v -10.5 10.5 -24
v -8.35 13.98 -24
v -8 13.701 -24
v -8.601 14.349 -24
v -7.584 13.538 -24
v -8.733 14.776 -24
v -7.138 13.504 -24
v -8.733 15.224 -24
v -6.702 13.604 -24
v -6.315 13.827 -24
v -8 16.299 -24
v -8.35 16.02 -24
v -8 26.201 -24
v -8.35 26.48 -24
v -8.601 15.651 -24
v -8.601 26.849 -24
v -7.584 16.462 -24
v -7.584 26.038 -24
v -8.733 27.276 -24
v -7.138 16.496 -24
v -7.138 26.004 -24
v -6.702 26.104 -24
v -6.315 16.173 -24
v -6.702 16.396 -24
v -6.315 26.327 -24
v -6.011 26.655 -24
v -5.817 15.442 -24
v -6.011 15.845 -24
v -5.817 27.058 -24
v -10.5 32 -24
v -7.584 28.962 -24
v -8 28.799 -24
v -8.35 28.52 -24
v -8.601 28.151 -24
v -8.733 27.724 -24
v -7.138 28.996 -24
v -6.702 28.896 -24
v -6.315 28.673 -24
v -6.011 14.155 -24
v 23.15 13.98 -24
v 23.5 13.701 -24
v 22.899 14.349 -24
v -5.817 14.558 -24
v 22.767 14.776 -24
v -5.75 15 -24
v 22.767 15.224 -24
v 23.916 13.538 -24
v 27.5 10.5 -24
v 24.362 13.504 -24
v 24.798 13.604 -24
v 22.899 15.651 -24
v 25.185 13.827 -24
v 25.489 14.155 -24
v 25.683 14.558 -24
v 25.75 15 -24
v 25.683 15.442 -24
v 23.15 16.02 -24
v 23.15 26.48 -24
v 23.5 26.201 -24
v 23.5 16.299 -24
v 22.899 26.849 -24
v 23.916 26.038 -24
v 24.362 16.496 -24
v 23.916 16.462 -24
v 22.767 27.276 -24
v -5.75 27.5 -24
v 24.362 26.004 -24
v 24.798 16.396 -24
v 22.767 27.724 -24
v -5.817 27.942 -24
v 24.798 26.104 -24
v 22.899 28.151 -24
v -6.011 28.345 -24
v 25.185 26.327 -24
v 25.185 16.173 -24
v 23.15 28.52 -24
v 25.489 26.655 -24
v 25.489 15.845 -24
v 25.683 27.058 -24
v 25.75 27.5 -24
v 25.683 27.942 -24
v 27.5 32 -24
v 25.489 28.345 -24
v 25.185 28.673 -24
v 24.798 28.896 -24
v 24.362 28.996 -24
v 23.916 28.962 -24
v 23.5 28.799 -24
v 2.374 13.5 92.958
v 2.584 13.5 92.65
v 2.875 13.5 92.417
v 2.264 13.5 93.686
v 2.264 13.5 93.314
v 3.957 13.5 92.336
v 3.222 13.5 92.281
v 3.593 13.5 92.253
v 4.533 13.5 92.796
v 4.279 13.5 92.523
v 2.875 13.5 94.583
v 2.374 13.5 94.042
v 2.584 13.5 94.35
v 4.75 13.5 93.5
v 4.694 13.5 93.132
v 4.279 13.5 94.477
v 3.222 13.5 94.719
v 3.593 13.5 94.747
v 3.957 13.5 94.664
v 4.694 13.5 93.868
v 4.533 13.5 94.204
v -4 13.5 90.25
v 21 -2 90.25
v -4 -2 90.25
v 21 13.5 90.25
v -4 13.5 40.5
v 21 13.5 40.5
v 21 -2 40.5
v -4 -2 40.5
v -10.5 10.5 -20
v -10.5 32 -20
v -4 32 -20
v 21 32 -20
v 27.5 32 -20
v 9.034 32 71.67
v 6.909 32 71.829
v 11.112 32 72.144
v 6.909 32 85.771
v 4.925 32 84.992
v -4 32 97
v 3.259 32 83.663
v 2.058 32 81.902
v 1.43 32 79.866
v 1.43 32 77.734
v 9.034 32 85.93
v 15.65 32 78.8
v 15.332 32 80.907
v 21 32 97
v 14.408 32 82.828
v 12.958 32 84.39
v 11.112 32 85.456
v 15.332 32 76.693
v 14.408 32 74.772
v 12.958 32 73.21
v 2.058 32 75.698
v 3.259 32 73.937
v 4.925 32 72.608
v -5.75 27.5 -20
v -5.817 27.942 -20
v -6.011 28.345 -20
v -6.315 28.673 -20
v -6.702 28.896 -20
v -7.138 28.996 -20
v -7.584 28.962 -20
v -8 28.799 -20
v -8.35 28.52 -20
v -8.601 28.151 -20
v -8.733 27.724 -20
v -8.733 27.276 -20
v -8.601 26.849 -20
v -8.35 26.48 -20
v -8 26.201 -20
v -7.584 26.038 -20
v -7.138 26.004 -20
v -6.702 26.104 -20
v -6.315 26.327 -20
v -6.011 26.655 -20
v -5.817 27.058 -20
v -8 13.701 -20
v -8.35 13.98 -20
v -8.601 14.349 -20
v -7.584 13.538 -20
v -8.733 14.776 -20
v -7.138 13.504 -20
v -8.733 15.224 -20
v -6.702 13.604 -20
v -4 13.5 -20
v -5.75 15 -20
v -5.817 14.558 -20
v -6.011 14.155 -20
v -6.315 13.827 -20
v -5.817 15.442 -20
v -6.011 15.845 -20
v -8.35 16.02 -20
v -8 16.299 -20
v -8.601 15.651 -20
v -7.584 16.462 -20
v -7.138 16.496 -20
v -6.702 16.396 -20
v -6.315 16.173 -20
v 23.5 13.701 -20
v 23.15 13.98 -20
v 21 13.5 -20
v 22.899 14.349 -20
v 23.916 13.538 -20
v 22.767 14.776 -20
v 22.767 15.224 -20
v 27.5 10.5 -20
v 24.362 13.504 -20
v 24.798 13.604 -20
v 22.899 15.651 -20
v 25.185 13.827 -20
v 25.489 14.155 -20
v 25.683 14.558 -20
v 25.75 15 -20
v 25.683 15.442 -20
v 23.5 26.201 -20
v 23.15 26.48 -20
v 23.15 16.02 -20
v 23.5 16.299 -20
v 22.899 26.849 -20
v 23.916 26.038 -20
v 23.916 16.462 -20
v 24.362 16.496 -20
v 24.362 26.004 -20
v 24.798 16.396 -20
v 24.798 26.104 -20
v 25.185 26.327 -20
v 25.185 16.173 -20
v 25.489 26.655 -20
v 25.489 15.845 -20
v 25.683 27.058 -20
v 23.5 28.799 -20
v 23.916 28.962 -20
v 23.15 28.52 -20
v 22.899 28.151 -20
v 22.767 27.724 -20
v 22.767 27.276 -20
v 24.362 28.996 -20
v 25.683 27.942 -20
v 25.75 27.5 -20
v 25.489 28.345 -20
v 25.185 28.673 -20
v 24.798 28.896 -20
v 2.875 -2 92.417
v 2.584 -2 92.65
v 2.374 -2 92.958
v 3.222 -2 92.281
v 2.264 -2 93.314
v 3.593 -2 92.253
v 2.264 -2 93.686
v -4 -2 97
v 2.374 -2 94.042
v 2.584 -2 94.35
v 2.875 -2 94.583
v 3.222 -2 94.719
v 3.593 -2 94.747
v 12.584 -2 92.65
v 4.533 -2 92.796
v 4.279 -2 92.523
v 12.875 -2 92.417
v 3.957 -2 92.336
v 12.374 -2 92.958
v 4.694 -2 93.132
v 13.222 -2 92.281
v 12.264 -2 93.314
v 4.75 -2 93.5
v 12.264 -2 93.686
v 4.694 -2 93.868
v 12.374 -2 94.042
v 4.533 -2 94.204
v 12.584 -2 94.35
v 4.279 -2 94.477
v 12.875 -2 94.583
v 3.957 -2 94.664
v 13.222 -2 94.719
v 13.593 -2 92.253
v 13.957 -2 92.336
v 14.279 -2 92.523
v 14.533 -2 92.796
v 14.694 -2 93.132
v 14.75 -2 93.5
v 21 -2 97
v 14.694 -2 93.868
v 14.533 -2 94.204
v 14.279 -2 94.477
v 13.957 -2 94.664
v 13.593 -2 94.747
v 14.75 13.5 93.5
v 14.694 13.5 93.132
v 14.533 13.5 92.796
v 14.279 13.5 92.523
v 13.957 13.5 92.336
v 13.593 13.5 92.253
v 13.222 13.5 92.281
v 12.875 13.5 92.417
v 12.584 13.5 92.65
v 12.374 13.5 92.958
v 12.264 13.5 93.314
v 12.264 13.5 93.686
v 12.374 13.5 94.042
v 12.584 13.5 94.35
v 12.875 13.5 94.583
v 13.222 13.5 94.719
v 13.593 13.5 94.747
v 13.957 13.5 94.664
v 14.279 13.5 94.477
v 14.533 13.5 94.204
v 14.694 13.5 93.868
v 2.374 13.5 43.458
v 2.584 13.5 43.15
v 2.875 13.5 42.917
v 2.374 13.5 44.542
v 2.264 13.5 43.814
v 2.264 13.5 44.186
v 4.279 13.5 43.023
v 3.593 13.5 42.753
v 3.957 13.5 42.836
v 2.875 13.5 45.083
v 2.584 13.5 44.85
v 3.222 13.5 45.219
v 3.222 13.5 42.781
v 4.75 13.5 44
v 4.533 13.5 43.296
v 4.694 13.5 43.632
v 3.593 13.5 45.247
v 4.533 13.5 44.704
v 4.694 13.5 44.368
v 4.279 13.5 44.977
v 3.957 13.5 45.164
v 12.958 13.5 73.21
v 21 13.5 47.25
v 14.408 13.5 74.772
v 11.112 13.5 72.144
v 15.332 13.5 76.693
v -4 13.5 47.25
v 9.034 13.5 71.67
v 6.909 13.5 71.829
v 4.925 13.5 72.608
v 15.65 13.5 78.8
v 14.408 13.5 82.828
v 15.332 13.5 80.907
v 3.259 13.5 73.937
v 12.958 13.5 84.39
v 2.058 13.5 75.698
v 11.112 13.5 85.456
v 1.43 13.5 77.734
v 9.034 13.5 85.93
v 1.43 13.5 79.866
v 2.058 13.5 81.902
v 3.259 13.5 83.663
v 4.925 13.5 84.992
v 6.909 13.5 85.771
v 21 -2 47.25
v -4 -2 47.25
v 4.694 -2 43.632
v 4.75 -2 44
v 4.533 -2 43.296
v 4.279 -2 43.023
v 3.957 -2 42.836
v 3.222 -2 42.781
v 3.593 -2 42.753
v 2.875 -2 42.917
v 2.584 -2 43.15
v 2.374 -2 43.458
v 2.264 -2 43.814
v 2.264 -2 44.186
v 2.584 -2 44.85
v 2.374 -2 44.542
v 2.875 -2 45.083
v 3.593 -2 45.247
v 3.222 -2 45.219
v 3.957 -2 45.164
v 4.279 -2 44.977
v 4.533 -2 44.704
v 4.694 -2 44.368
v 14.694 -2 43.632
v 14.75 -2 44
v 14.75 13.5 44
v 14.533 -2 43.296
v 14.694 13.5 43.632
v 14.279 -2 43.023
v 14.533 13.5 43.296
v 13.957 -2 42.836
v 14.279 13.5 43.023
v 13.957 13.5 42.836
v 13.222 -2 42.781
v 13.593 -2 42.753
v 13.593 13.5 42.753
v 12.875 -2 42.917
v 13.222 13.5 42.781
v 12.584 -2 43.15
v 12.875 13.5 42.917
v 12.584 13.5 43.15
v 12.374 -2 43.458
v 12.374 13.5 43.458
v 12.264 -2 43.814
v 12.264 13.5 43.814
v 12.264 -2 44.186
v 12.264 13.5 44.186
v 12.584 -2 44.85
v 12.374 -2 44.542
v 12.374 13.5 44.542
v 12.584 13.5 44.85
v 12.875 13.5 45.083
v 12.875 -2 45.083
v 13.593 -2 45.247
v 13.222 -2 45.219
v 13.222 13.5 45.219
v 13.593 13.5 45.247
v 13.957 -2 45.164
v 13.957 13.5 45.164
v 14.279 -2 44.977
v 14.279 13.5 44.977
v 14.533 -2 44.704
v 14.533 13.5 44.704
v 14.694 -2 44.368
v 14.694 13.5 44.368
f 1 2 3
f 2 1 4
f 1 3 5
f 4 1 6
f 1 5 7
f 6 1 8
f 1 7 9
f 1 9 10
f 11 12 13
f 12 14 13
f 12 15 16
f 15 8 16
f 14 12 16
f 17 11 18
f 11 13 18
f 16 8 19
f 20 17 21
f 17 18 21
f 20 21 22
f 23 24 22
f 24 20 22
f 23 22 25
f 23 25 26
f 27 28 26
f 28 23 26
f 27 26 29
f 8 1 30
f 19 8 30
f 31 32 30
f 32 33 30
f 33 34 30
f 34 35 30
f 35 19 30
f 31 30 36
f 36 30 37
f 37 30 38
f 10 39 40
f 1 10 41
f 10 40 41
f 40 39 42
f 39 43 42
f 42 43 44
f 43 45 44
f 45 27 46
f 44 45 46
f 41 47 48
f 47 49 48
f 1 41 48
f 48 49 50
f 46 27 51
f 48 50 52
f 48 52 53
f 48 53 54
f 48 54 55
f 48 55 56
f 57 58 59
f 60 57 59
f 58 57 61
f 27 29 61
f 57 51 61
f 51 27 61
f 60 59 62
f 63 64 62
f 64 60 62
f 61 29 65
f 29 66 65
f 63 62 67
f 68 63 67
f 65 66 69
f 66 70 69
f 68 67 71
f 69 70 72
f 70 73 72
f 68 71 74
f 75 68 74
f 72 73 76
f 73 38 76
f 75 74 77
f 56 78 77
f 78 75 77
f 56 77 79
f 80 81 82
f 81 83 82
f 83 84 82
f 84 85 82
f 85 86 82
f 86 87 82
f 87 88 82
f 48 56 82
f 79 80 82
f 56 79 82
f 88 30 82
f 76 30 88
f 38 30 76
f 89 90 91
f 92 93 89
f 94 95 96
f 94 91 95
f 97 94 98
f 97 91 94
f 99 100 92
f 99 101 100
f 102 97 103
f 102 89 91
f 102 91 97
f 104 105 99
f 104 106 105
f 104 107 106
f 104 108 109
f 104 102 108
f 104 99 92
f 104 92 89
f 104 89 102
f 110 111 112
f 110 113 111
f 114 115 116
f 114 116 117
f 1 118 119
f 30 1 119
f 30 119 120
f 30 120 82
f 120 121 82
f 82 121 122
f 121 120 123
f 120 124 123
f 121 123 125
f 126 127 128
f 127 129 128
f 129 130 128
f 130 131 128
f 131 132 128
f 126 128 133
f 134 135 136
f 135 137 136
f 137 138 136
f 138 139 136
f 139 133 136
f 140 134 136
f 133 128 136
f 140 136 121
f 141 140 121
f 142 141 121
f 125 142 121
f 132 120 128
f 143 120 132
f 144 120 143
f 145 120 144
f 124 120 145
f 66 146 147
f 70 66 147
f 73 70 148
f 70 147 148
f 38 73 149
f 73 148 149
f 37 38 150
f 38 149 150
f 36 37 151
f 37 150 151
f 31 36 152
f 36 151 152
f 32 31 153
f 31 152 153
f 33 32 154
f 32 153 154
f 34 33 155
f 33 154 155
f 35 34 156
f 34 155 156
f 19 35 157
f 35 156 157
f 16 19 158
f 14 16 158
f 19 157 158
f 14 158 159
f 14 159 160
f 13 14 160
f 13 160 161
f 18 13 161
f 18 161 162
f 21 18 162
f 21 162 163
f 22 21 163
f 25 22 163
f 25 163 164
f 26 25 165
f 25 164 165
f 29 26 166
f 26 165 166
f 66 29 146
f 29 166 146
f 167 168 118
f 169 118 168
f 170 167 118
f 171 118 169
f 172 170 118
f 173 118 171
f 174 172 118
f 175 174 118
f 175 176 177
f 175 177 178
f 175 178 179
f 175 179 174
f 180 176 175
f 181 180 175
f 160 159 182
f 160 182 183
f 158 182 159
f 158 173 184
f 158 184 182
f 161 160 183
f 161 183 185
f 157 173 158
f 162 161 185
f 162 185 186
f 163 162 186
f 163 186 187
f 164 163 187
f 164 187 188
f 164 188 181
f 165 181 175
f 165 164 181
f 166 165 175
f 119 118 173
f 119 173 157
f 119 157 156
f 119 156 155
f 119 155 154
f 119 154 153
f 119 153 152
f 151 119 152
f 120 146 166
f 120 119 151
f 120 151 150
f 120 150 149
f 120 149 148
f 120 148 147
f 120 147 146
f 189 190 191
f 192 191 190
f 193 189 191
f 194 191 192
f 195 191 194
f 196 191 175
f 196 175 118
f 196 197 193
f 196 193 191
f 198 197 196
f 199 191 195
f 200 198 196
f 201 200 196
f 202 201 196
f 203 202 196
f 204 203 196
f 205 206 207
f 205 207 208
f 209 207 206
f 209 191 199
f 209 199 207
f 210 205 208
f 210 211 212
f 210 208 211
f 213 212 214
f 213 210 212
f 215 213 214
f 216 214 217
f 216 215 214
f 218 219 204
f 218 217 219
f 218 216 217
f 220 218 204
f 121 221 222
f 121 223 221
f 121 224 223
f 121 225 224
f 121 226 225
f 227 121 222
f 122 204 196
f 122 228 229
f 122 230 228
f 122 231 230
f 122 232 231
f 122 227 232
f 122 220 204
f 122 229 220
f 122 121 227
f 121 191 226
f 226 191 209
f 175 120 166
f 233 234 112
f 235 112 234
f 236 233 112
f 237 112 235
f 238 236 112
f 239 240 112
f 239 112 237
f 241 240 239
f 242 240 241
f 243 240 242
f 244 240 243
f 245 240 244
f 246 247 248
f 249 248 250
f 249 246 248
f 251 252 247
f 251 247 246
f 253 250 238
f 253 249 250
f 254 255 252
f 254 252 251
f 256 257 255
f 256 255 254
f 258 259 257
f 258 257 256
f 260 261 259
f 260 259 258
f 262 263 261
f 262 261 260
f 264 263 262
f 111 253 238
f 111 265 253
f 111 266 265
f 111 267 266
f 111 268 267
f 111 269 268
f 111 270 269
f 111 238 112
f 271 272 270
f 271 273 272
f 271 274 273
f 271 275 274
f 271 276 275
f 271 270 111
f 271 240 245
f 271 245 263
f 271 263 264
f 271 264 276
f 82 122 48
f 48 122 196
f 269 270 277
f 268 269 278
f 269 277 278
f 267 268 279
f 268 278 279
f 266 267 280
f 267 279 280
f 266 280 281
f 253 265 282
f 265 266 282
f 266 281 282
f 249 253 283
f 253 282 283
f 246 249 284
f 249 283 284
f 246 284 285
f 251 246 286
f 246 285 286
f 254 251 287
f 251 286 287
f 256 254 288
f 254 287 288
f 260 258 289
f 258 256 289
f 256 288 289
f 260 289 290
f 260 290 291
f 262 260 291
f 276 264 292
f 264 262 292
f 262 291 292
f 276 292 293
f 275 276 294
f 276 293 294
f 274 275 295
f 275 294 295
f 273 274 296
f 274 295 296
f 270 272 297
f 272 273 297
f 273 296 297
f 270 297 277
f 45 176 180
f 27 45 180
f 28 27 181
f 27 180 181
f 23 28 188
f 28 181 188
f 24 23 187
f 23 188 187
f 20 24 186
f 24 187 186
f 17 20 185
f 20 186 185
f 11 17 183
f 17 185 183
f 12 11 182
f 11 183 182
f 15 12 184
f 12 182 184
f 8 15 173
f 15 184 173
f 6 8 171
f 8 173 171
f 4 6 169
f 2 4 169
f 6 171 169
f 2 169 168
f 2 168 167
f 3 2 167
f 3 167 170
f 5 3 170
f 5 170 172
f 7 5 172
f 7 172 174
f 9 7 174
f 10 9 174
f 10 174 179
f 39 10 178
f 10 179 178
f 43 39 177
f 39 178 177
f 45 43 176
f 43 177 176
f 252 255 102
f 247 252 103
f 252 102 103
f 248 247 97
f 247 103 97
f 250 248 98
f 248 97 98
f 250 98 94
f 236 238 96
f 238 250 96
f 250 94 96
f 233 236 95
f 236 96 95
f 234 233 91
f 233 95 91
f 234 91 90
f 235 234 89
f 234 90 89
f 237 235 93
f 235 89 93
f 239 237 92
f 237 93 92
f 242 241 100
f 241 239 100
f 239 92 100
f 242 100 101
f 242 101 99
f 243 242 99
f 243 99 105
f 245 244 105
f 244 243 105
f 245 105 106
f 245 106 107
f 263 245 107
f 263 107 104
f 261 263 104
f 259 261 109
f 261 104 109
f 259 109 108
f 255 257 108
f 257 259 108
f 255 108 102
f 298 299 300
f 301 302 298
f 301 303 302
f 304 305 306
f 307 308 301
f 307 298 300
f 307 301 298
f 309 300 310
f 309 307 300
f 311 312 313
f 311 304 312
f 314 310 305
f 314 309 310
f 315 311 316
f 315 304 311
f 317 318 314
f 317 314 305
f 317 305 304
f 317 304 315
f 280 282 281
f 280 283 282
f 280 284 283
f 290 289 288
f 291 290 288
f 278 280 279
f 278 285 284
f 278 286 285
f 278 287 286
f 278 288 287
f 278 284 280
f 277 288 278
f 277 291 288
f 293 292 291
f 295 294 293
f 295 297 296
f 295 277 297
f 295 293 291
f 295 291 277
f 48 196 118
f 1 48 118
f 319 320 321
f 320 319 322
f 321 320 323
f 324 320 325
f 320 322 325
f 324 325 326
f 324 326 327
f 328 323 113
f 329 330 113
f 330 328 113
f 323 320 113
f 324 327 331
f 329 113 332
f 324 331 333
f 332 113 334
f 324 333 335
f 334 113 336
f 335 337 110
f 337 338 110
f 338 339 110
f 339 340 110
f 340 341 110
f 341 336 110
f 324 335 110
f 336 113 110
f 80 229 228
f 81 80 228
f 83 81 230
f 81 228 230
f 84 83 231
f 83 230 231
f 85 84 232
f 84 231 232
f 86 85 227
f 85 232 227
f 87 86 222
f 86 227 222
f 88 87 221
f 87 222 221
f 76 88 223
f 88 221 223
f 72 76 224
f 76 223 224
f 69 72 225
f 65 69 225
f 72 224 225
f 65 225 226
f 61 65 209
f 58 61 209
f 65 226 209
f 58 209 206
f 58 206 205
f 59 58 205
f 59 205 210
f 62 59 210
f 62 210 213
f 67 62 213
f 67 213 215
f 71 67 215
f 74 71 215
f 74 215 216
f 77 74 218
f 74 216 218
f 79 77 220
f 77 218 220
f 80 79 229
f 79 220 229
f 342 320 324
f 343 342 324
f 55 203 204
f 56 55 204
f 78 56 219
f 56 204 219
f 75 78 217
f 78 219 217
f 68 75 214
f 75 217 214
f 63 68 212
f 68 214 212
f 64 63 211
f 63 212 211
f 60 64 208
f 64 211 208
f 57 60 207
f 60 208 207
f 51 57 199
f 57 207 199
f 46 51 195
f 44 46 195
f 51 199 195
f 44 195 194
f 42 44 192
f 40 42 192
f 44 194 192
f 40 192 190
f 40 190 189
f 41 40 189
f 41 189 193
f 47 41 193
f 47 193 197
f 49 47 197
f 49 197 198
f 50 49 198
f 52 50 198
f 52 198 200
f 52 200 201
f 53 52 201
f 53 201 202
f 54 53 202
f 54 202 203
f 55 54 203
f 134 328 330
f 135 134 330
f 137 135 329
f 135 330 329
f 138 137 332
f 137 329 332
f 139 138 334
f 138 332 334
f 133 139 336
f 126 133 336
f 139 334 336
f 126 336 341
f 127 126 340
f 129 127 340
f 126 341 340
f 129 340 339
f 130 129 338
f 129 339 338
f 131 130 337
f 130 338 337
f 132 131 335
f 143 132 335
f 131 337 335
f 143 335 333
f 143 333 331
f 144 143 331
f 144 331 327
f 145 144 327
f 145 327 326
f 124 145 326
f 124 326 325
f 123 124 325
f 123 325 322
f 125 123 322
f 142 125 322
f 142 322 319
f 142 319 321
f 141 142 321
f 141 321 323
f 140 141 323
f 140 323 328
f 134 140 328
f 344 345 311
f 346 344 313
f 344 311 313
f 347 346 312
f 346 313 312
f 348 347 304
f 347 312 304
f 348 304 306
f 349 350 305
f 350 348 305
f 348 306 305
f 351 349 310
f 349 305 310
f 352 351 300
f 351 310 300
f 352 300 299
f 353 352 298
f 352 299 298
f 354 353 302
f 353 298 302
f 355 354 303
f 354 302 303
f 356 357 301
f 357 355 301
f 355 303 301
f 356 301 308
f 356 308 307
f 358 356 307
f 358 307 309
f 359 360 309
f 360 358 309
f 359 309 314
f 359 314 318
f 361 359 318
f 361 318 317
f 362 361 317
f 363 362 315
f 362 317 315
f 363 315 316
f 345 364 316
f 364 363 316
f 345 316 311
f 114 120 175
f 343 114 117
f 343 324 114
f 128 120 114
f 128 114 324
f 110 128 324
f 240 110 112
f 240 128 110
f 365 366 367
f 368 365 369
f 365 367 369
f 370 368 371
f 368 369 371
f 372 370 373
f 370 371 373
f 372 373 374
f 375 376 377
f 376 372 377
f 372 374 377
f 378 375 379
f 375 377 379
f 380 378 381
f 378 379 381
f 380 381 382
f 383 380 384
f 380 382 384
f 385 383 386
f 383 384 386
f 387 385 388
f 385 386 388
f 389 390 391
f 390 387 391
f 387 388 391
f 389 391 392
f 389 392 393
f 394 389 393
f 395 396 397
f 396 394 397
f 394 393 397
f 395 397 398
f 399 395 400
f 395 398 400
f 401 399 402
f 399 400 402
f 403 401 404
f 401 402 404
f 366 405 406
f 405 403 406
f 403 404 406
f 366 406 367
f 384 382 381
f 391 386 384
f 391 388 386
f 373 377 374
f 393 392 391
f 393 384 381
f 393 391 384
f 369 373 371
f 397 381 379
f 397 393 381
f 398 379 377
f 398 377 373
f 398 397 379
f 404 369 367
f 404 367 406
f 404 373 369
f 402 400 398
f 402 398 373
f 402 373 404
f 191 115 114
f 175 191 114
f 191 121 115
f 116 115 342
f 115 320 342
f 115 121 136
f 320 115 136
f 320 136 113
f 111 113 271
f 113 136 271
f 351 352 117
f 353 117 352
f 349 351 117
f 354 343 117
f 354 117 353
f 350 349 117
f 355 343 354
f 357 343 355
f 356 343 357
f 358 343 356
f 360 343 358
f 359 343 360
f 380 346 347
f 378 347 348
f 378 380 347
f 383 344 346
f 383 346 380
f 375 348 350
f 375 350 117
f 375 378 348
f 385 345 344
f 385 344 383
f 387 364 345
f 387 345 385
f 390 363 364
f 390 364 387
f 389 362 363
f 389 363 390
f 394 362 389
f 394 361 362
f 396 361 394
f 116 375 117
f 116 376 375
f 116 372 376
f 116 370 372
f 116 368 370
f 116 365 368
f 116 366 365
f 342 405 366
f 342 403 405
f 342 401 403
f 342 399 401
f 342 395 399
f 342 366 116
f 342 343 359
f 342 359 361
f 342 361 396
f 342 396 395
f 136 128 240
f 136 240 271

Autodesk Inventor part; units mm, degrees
ref_plane "YZ Plane" through (0, 0, 0) normal (1, 0, 0) x (0, 1, 0)
ref_plane "XZ Plane" through (0, 0, 0) normal (0, 1, 0) x (-1, 0, 0)
ref_plane "XY Plane" through (0, 0, 0) normal (0, 0, 1) x (1, 0, 0)
sketch "Sketch14" plane through (0, 0, 0) normal (0, 0, 1) x (1, 0, 0)
  line L0 (0, 0) -> (17, 0)
  line L1 (17, 0) -> (17, 30)
  line L2 (17, 30) -> (0, 30)
  line L3 (0, 30) -> (0, 0)
  line L4 (-6, 36) -> (23, 36)
  line L5 (23, 36) -> (23, -6)
  line L6 (23, -6) -> (-6, -6)
  line L7 (-6, -6) -> (-6, 36)
  dimension "d55" = 17
  dimension "d56" = 30
  dimension "d57" = 6
extrude "Extrusion12" add sketch "Sketch14" against normal blind 3 contours L3 L2 L1 L0 | L4 L5 L6 L7
extrude "Extrusion13" add sketch "Sketch14" along normal blind 90 contours L3 L2 L1 L0
sketch "Sketch15" plane through (0, 0, 0) normal (0, -1, 0) x (1, 0, 0)
  line L0 (0, 0) -> (0, 90) projected
  line L1 (0, 90) -> (17.1111, 90)
  line L2 (0, 90) -> (17, 90)
  line L3 (17, 90) -> (17, 97)
  line L4 (17, 97) -> (0, 97)
  line L5 (0, 97) -> (0, 90)
  line L6 (17, 90) -> (0, 90) projected
  circle A0 centre (3.5, 93.5) radius 1.25
  circle A1 centre (13.5, 93.5) radius 1.25
  line L7 (8.5, 113.1) -> (8.5, 78.8)
  circle A2 centre (8.5, 78.8) radius 7.15
  circle A3 centre (3.5, 44) radius 1.25
  circle A4 centre (13.5, 44) radius 1.25
  line L8 (17, 0) -> (17, 90) projected
  line L9 (0, 97) -> (17, 97)
  line L10 (17, 97) -> (17, 42)
  line L11 (17, 42) -> (0, 42)
  line L12 (0, 42) -> (0, 97)
  line L13 (8.5, 113.1) -> (8.5, 98.4)
  line L14 (3.5, 44) -> (13.5, 44)
  dimension "d67" = 7
  dimension "d70" = 2.5
  dimension "d71" = 2.5
  dimension "d72" = 34.3
  dimension "d73" = 14.3
  dimension "d79" = 55
  dimension "d95" = 14.7
extrude "Extrusion14" cut sketch "Sketch15" against normal blind 169.375 contours A2
extrude "Extrusion15" cut sketch "Sketch15" against normal blind 15.5 contours L0 L1 L8 L11
extrude "Extrusion16" cut sketch "Sketch15" against normal blind 20 contours A3 | A4
extrude "Extrusion17" add sketch "Sketch15" against normal blind 30 contours L5 L4 L7 L1 | L7 L4 L3 L1
sketch "Sketch16" plane through (0, 0, 0) normal (0, -1, 0) x (1, 0, 0)
  line L0 (0, 0) -> (0, 97) projected
  line L1 (17, 0) -> (17, 97) projected
  line L2 (0, 97) -> (17, 97)
  line L3 (17, 97) -> (17, 90)
  line L4 (17, 90) -> (0, 90)
  line L5 (0, 90) -> (0, 97)
  dimension "d86" = 7
extrude "Extrusion18" cut sketch "Sketch15" against normal blind 15.5 contours L5 L4 L7 L1 | L7 L4 L3 L1
sketch "Sketch17" plane through (0, 15.5, 0) normal (0, -1, 0) x (1, 0, 0)
  line L0 (0, 97) -> (17, 97) projected
  line L1 (17, 0) -> (17, 97) projected
  line L2 (0, 97) -> (17, 97)
  line L3 (17, 97) -> (17, 91)
  line L4 (17, 91) -> (0, 91)
  line L5 (0, 91) -> (0, 97)
  line L6 (17, 42) -> (0, 42) projected
  line L7 (0, 42) -> (17, 42)
  line L8 (17, 42) -> (17, 47)
  line L9 (17, 47) -> (0, 47)
  line L10 (0, 47) -> (0, 42)
  circle A0 centre (3.5, 44) radius 1.25 projected
  circle A1 centre (3.5, 44) radius 1.25
  circle A2 centre (13.5, 44) radius 1.25 projected
  circle A3 centre (13.5, 44) radius 1.25
  circle A4 centre (3.5, 93.5) radius 1.25 projected
  circle A5 centre (3.5, 93.5) radius 1.25
  circle A6 centre (13.5, 93.5) radius 1.25 projected
  circle A7 centre (13.5, 93.5) radius 1.25
  point P0 (0, 0)
  dimension "d89" = 6
  dimension "d90" = 5
  dimension "d91" = 2.5
  dimension "d92" = 2.5
extrude "Extrusion19" add sketch "Sketch17" along normal blind 15.5
sketch "Sketch19" plane through (0, 0, 0) normal (0, -1, 0) x (1, 0, 0)
  line L0 (0, 0) -> (0, 47) projected
  line L1 (17, 0) -> (17, 47) projected
  line L2 (0, 0) -> (17, 0)
  line L3 (17, 0) -> (17, 40)
  line L4 (17, 40) -> (0, 40)
  line L5 (0, 40) -> (0, 0)
  dimension "d96" = 40
extrude "Extrusion20" cut sketch "Sketch19" against normal blind 15.5
sketch "Sketch23" plane through (0, 0, 0) normal (0, 0, 1) x (1, 0, 0)
  line L0 (0, 15.5) -> (17, 15.5) projected
  line L1 (0, 15.5) -> (0, 9.5)
  line L2 (0, 15.5) -> (0, 0) projected
  line L3 (0, 9.5) -> (-6, 9.5)
  line L4 (-6, -6) -> (-6, 36) projected
  line L5 (23, 36) -> (23, -6) projected
  line L6 (23, 9.5) -> (0, 9.5)
  line L7 (-6, 9.5) -> (23, 9.5)
  line L8 (23, 9.5) -> (23, 36)
  line L9 (23, 36) -> (-6, 36)
  line L10 (-6, 36) -> (-6, 9.5)
  line L11 (23, -6) -> (-6, -6) projected
  line L12 (-6, -6) -> (23, -6)
  line L13 (23, -6) -> (23, 9.5)
  line L14 (23, 9.5) -> (-6, 9.5)
  line L15 (-6, 9.5) -> (-6, -6)
  dimension "d99" = 6
extrude "Extrusion21" cut sketch "Sketch23" against normal blind 15.5 contours L6 L5 L11 L4 L3
sketch "Sketch24" plane through (0, 30, 97) normal (0, 0, 1) x (1, 0, 0)
  line L0 (17, 0) -> (17, -14.5) projected
  line L1 (17, 0) -> (19, 0)
  line L2 (19, 0) -> (19, 2)
  line L3 (0, -14.5) -> (0, -30) projected
  line L4 (0, -14.5) -> (-2, -14.5)
  line L5 (-2, -14.5) -> (-2, -16.5)
  line L6 (-2, -16.5) -> (19, -16.5)
  line L7 (19, -16.5) -> (19, 2)
  line L8 (19, 2) -> (-2, 2)
  line L9 (-2, 2) -> (-2, -16.5)
  dimension "d111" = 2
  dimension "d112" = 2
  dimension "d113" = 2
  dimension "d114" = 2
extrude "Extrusion22" add sketch "Sketch24" against normal blind 97
extrude "Extrusion23" cut sketch "Sketch15" against normal blind 169.375 contours A2
sketch "Sketch26" plane through (-2, 13.5, 0) normal (0, -1, 0) x (1, 0, 0)
  line L0 (0, 97) -> (2, 97) projected
  line L1 (2, 97) -> (2, 91) projected
  line L2 (0, 97) -> (2, 97)
  line L3 (2, 97) -> (2, 91)
  line L4 (2, 91) -> (0, 91)
  line L5 (0, 91) -> (0, 97)
  line L6 (2, 91) -> (19, 91) projected
  line L7 (19, 97) -> (21, 97) projected
  line L8 (19, 91) -> (21, 91)
  line L9 (21, 91) -> (21, 97)
  line L10 (21, 97) -> (19, 97)
  line L11 (19, 97) -> (19, 91)
  line L12 (2, 40) -> (19, 40) projected
  line L13 (0, 97) -> (0, 0) projected
  line L14 (2, 40) -> (0, 40)
  line L15 (0, 40) -> (0, 47)
  line L16 (0, 47) -> (2, 47)
  line L17 (2, 47) -> (2, 40)
  line L18 (19, 40) -> (19, 47) projected
  line L19 (21, 97) -> (21, 0) projected
  line L20 (19, 40) -> (21, 40)
  line L21 (21, 40) -> (21, 47)
  line L22 (21, 47) -> (19, 47)
  line L23 (19, 47) -> (19, 40)
  point P0 (2, 0)
  point P1 (0, 40)
  dimension "d119" = 7
extrude "Extrusion24" add sketch "Sketch26" along normal blind 13.5 contours L0 L1 L4 L5 | L16 L17 L14 L13 | L11 L7 L9 L8 | L19 L20 L18 L22
sketch "Sketch27" plane through (0, 0, 0) normal (0, 0, 1) x (1, 0, 0)
  point P0 (0, 0)
sketch "Sketch28" plane through (0, 0, 0) normal (0, 0, 1) x (1, 0, 0)
  line L0 (-6, 9.5) -> (-6, 36) projected
  line L1 (-6, 36) -> (23, 36) projected
  line L2 (-6, 31.9237) -> (23, 31.9237)
  line L3 (23, 31.9237) -> (23, 36)
  line L4 (23, 36) -> (-6, 36)
  line L5 (-6, 36) -> (-6, 31.9237)
  point P0 (0, 0)
extrude "Extrusion25" cut sketch "Sketch28" against normal blind 13.5
sketch "Sketch29" plane through (0, 0, 0) normal (0, -1, 0) x (1, 0, 0)
  point P0 (0, 0)
sketch "Sketch30" plane through (0, 0, 0) normal (0, -1, 0) x (1, 0, 0)
  line L0 (19, 97) -> (-2, 97) projected
  line L1 (-2, 91) -> (19, 91) projected
  line L2 (-2, 97) -> (19, 97)
  line L3 (19, 97) -> (19, 91)
  line L4 (19, 91) -> (-2, 91)
  line L5 (-2, 91) -> (-2, 97)
  line L6 (-2, 47) -> (-2, 40) projected
  line L7 (-2, 40) -> (19, 40) projected
  line L8 (-2, 47) -> (19, 47)
  line L9 (19, 47) -> (19, 40)
  line L10 (19, 40) -> (-2, 40)
  line L11 (-2, 40) -> (-2, 47)
  circle A0 centre (3.5, 93.5) radius 1.25 projected
  circle A1 centre (3.5, 93.5) radius 1.25
  circle A2 centre (13.5, 93.5) radius 1.25 projected
  circle A3 centre (13.5, 93.5) radius 1.25
  circle A4 centre (3.5, 44) radius 1.25 projected
  circle A5 centre (3.5, 44) radius 1.25
  circle A6 centre (13.5, 44) radius 1.25 projected
  circle A7 centre (13.5, 44) radius 1.25
  point P0 (0, 0)
extrude "Extrusion26" add sketch "Sketch30" along normal blind 2
sketch "Sketch31" plane through (0, 0, -3) normal (0, 0, -1) x (-1, 0, 0)
  point P0 (0, 0)
  point P1 (6, 9.5)
  point P2 (-23, 31.9237)
sketch "Sketch32" plane through (-2, 13.5, 47) normal (0, -1, 0) x (1, 0, 0)
  point P0 (2, -47)
sketch "Sketch33" plane through (-2, 32, 97) normal (0, 0, 1) x (1, 0, 0)
  line L0 (21, -34) -> (21, 0) projected
  line L1 (-4, -22.5) -> (25, -22.5) projected
  line L2 (21, 0) -> (23, 0)
  line L3 (23, 0) -> (23, -22.5)
  line L4 (23, -22.5) -> (21, -22.5)
  line L5 (21, -22.5) -> (21, 0)
  line L6 (0, -18.5) -> (0, -34) projected
  line L7 (-4, -0.0763) -> (25, -0.0763) projected
  line L8 (0, -22.5) -> (-2, -22.5)
  line L9 (-2, -22.5) -> (-2, -0.0763)
  line L10 (-2, -0.0763) -> (0, -0.0763)
  line L11 (0, -0.0763) -> (0, -22.5)
  line L12 (0, -18.5) -> (-2, -18.5)
  line L13 (21, -18.5) -> (21, -34) projected
  line L14 (21, -18.5) -> (23, -18.5)
  point P0 (2, -32)
  point P1 (0, -0.0763)
  point P2 (23, -0.0763)
  point P3 (21, -0.0763)
  dimension "d126" = 2
  dimension "d127" = 2
extrude "Extrusion27" add sketch "Sketch33" against normal blind 100 contours L0 L7 L3 L14 | L12 L9 L7 L11
sketch "Sketch34" plane through (0, -2, 0) normal (0, -1, 0) x (1, 0, 0)
  line L0 (-2, 47) -> (19, 47) projected
  line L1 (-2, 47) -> (-2, 40) projected
  line L2 (19, 47) -> (-2, 47)
  line L3 (-2, 47) -> (-2, 41)
  line L4 (-2, 41) -> (19, 41)
  line L5 (19, 41) -> (19, 47)
  line L6 (-2, 40) -> (19, 40) projected
  line L7 (19, 41) -> (-2, 41)
  line L8 (-2, 41) -> (-2, 40)
  line L9 (-2, 40) -> (19, 40)
  line L10 (19, 40) -> (19, 41)
  point P0 (0, 0)
  dimension "d130" = 6
sketch "Sketch35" plane through (0, -2, 0) normal (0, -1, 0) x (1, 0, 0)
  line L0 (-2, 47) -> (19, 47) projected
  line L1 (-2, 47) -> (-2, 91) projected
  line L2 (19, 47) -> (-2, 47)
  line L3 (-2, 47) -> (-2, 46.5)
  line L4 (-2, 46.5) -> (19, 46.5)
  line L5 (19, 46.5) -> (19, 47)
  line L6 (-2, 40) -> (19, 40) projected
  line L7 (-2, 47) -> (-2, 40) projected
  line L8 (19, 40) -> (-2, 40)
  line L9 (-2, 40) -> (-2, 40.5)
  line L10 (-2, 40.5) -> (19, 40.5)
  line L11 (19, 40.5) -> (19, 40)
  point P0 (0, 0)
  point P1 (-2, 41)
  dimension "d133" = 0.5
  dimension "d136" = 0.5
extrude "Extrusion29" cut sketch "Sketch35" against normal blind 15.5 contours L0 L5 L4 L3
extrude "Extrusion30" cut sketch "Sketch35" against normal blind 15.5 contours L10 L11 L6 L7
sketch "Sketch36" plane through (-2, 13.5, 91) normal (0, -1, 0) x (1, 0, 0)
  line L0 (-2, 6) -> (0, 6) projected
  line L1 (21, 0) -> (0, 0) projected
  line L2 (-2, 6) -> (0, 6)
  line L3 (0, 6) -> (0, 0)
  line L4 (0, 0) -> (-2, 0)
  line L5 (-2, 0) -> (-2, 6)
  line L6 (21, 0) -> (21, 6) projected
  line L7 (23, 6) -> (23, -91) projected
  line L8 (21, 6) -> (23, 6)
  line L9 (23, 6) -> (23, 0)
  line L10 (23, 0) -> (21, 0)
  line L11 (21, 0) -> (21, 6)
  line L12 (21, -44.5) -> (0, -44.5) projected
  line L13 (-2, 6) -> (-2, -91) projected
  line L14 (0, -44.5) -> (-2, -44.5)
  line L15 (-2, -44.5) -> (-2, -50.5)
  line L16 (-2, -50.5) -> (0, -50.5)
  line L17 (0, -50.5) -> (0, -44.5)
  line L18 (21, -44.5) -> (23, -44.5)
  line L19 (23, -44.5) -> (23, -50.5)
  line L20 (23, -50.5) -> (21, -50.5)
  line L21 (21, -50.5) -> (21, -44.5)
  point P0 (2, -91)
  point P1 (23, -44.5)
  dimension "d139" = 6
extrude "Extrusion31" add sketch "Sketch36" along normal blind 15.5 contours L0 L3 L4 L5 | L14 L17 L16 L13 | L6 L8 L7 L10 | L18 L7 L20 L21
sketch "Sketch37" plane through (0, 0, -3) normal (0, 0, -1) x (-1, 0, 0)
  line L0 (-23, 9.5) -> (6, 9.5) projected
  line L1 (-23, 9.5) -> (6, 9.5)
  line L2 (6, 9.5) -> (6, 32)
  line L3 (6, 32) -> (-23, 32)
  line L4 (-23, 32) -> (-23, 9.5)
  point P0 (0, 0)
  point P1 (6, 9.5)
  dimension "d142" = 29
extrude "Extrusion32" add sketch "Sketch37" against normal blind 3
sketch "Sketch38" plane through (0, 0, -3) normal (0, 0, -1) x (-1, 0, 0)
  line L0 (-23, 9.5) -> (6, 9.5) projected
  line L1 (-23, 9.5) -> (-27, 9.5)
  line L2 (-27, 9.5) -> (-27, 32)
  line L3 (6, 32) -> (-23, 32) projected
  line L4 (-27, 32) -> (6, 32)
  line L5 (6, 9.5) -> (10, 9.5)
  line L6 (10, 9.5) -> (10, 32)
  line L7 (10, 32) -> (-27, 32)
  point P0 (0, 0)
  dimension "d145" = 4
  dimension "d146" = 4
extrude "Extrusion33" add sketch "Sketch38" against normal blind 3
sketch "Sketch39" plane through (0, 0, 0) normal (0, 0, 1) x (1, 0, 0)
  line L0 (21, 31.9237) -> (19, 31.9237) projected
  line L1 (19, 32) -> (19, 31.9237) projected
  line L2 (21, 31.9237) -> (19, 31.9237)
  line L3 (19, 31.9237) -> (19, 32)
  line L4 (19, 32) -> (21, 32)
  line L5 (21, 32) -> (21, 31.9237)
  line L6 (-2, 31.9237) -> (-2, 32) projected
  line L7 (-2, 31.9237) -> (-4, 31.9237) projected
  line L8 (-2, 32) -> (-4, 32)
  line L9 (-4, 32) -> (-4, 31.9237)
  line L10 (-4, 31.9237) -> (-2, 31.9237)
  line L11 (-2, 31.9237) -> (-2, 32)
  point P0 (0, 0)
extrude "Extrusion34" add sketch "Sketch39" along normal blind 97
sketch "Sketch40" plane through (0, 0, 0) normal (0, 0, 1) x (1, 0, 0)
  point P0 (0, 0)
sketch "Sketch41" plane through (0, 0, 0) normal (0, 0, 1) x (1, 0, 0)
  line L0 (-10, 32) -> (-10, 27.5)
  line L1 (-10, 32) -> (-10, 9.5) projected
  line L2 (-10, 9.5) -> (27, 9.5) projected
  line L3 (-10, 9.5) -> (-10, 14)
  line L4 (-10, 9.5) -> (-10.5, 9.5)
  line L5 (-10.5, 9.5) -> (-10.5, 32)
  line L6 (-10.5, 32) -> (-10, 32)
  line L7 (-10, 32) -> (-10, 9.5)
  line L8 (-10.5, 14) -> (-7.5, 14)
  line L9 (-10.5, 27.5) -> (-7.5, 27.5)
  circle A0 centre (-7.5, 14) radius 1.5
  circle A1 centre (-7.5, 27.5) radius 1.5
  line L10 (27, 9.5) -> (27, 32) projected
  line L11 (27, 9.5) -> (27.5, 9.5)
  line L12 (27.5, 9.5) -> (27.5, 32)
  line L13 (27.5, 32) -> (27, 32)
  line L14 (27, 32) -> (27, 9.5)
  line L15 (27.5, 9.5) -> (27.5, 14)
  line L16 (27.5, 14) -> (24.5, 14)
  line L17 (27.5, 32) -> (27.5, 27.5)
  line L18 (27.5, 27.5) -> (24.5, 27.5)
  circle A2 centre (24.5, 14) radius 1.5
  circle A3 centre (24.5, 27.5) radius 1.5
  point P0 (0, 0)
  dimension "d151" = 4.5
  dimension "d152" = 4.5
  dimension "d153" = 0.5
  dimension "d154" = 3
  dimension "d155" = 3
  dimension "d156" = 3
  dimension "d157" = 3
  dimension "d158" = 0.5
  dimension "d159" = 4.5
  dimension "d160" = 3
  dimension "d161" = 4.5
  dimension "d162" = 3
  dimension "d163" = 3
  dimension "d164" = 3
sketch "Sketch42" plane through (0, 0, -3) normal (0, 0, -1) x (-1, 0, 0)
  point P0 (0, 0)
sketch "Sketch43" plane through (0, 0, -3) normal (0, 0, -1) x (-1, 0, 0)
  line L0 (-21, -2) -> (-21, 32) projected
  line L1 (4, 13.5) -> (4, -2) projected
  line L2 (-21, 32) -> (4, 32)
  line L3 (4, 32) -> (4, 9.5)
  line L4 (4, 9.5) -> (-21, 9.5)
  line L5 (-21, 9.5) -> (-21, 32)
  point P0 (0, 0)
  dimension "d165" = 22.5
sketch "Sketch44" plane through (0, 0, -3) normal (0, 0, -1) x (-1, 0, 0)
  line L0 (10, 9.5) -> (10, 32) projected
  line L1 (10, 9.5) -> (-28.3786, 9.5)
  line L2 (-28.3786, 9.5) -> (-28.3786, 33.0505)
  line L3 (-28.3786, 33.0505) -> (10, 33.0505)
  line L4 (10, 33.0505) -> (10, 9.5)
  point P0 (0, 0)
extrude "Extrusion35" cut sketch "Sketch44" against normal blind 3
sketch "Sketch45" plane through (0, 0, 0) normal (0, 0, -1) x (-1, 0, 0)
  line L0 (4, 13.5) -> (-21, 13.5) projected
  line L1 (4, 32) -> (4, -2) projected
  line L2 (-21, 13.5) -> (4, 13.5)
  line L3 (4, 13.5) -> (4, 32)
  line L4 (4, 32) -> (-21, 32)
  line L5 (-21, 32) -> (-21, 13.5)
  point P0 (0, 0)
extrude "Extrusion36" add sketch "Sketch45" along normal blind 20
sketch "Sketch46" plane through (0, 0, -20) normal (0, 0, -1) x (-1, 0, 0)
  line L0 (-21, 32) -> (4, 32) projected
  line L1 (-21, 32) -> (-27.5, 32)
  line L2 (-27.5, 32) -> (-27.5, 13.5)
  line L3 (-27.5, 13.5) -> (-21, 13.5)
  line L4 (-21, 13.5) -> (-21, 32)
  line L5 (4, 32) -> (4, -2) projected
  line L6 (4, 32) -> (10.5, 32)
  line L7 (10.5, 32) -> (10.5, 13.5)
  line L8 (10.5, 13.5) -> (4, 13.5)
  line L9 (4, 13.5) -> (4, 32)
  line L10 (10.5, 13.5) -> (-27.5, 13.5)
  point P0 (0, 0)
extrude "Extrusion37" add sketch "Sketch46" along normal blind 4
sketch "Sketch47" plane through (0, 0, -20) normal (0, 0, 1) x (1, 0, 0)
  line L0 (-4, 13.5) -> (-10.5, 13.5) projected
  line L1 (-10.5, 13.5) -> (27.5, 13.5)
  line L2 (27.5, 13.5) -> (27.5, 10.5)
  line L3 (27.5, 10.5) -> (-10.5, 10.5)
  line L4 (-10.5, 10.5) -> (-10.5, 13.5)
  point P0 (0, 0)
  dimension "d175" = 3
extrude "Extrusion38" add sketch "Sketch47" against normal blind 4
sketch "Sketch48" plane through (0, 0, -20) normal (0, 0, 1) x (1, 0, 0)
  line L0 (-10.5, 10.5) -> (27.5, 10.5) projected
  line L1 (-10.5, 10.5) -> (-10.5, 15)
  line L2 (-10.5, 10.5) -> (-10.5, 32) projected
  line L3 (-10.5, 15) -> (-7.25, 15)
  line L4 (-10.5, 32) -> (-10.5, 27.5)
  line L5 (-10.5, 27.5) -> (-7.25, 27.5)
  circle A0 centre (-7.25, 15) radius 1.5
  circle A1 centre (-7.25, 27.5) radius 1.5
  line L6 (27.5, 32) -> (27.5, 10.5) projected
  line L7 (27.5, 10.5) -> (27.5, 15)
  line L8 (27.5, 15) -> (27.5, 18)
  line L9 (27.5, 15) -> (24.25, 15)
  line L10 (-10.5, 32) -> (27.5, 32) projected
  line L11 (27.5, 32) -> (27.5, 27.5)
  line L12 (27.5, 27.5) -> (24.25, 27.5)
  circle A2 centre (24.25, 27.5) radius 1.5
  circle A3 centre (24.25, 15) radius 1.5
  line L13 (-7.5, 15) -> (-7.25, 15)
  line L14 (24.5, 15) -> (24.25, 15)
  point P0 (0, 0)
  dimension "d178" = 4.5
  dimension "d180" = 4.5
  dimension "d184" = 4.5
  dimension "d185" = 3
  dimension "d187" = 4.5
  dimension "d195" = 0.25
extrude "Extrusion39" cut sketch "Sketch48" against normal blind 4 contours A3 | A2 | A1 | A0
sketch "Sketch49" plane through (0, -2, 0) normal (0, -1, 0) x (1, 0, 0)
  point P0 (0, 0)
sketch "Sketch50" plane through (-4, 13.5, 91) normal (0, -1, 0) x (1, 0, 0)
  point P0 (4, -91)
sketch "019855" plane through (-4, 13.5, 91) normal (0, -1, 0) x (1, 0, 0)
  circle A0 centre (12.5, -12.2) radius 7.15 projected
  line L0 (19.65, -10.7) -> (19.65, -13.7)
  line L1 (19.65, -13.7) -> (19.65, -12.2)
  line L2 (5.35, -10.7) -> (5.35, -13.7)
  line L3 (5.5091, -12.2) -> (5.35, -12.2)
  line L4 (19.65, -10.7) -> (19.65, -13.7)
  line L5 (5.35, -13.7) -> (5.35, -10.7)
  point P0 (4, -91)
  point P1 (19.65, -12.2)
thread "Thread5" size "M2.5x0.45" class "6H" standard "ANSI Metric M Profile" full length
thread "Thread6" size "M2.5x0.45" class "6H" standard "ANSI Metric M Profile" full length
thread "Thread7" size "M2.5x0.45" class "6H" standard "ANSI Metric M Profile" full length
thread "Thread8" size "M2.5x0.45" class "6H" standard "ANSI Metric M Profile" full length
sketch "Sketch52" plane through (0, -2, 0) normal (0, -1, 0) x (1, 0, 0)
  point P0 (0, 0)
sketch "Sketch53" plane through (-4, 13.5, 91) normal (0, -1, 0) x (1, 0, 0)
  line L0 (0, 0) -> (25, 0) projected
  line L1 (25, 6) -> (25, -111) projected
  line L2 (0, 0) -> (25, 0)
  line L3 (25, 0) -> (25, -0.5)
  line L4 (25, -0.5) -> (0, -0.5)
  line L5 (0, -0.5) -> (0, 0)
  line L6 (25, -44.5) -> (0, -44.5) projected
  line L7 (0, -44.5) -> (25, -44.5)
  line L8 (25, -44.5) -> (25, -44)
  line L9 (25, -44) -> (0, -44)
  line L10 (0, -44) -> (0, -44.5)
  line L11 (0, -44) -> (25, -44)
  line L12 (25, -44) -> (25, -43.75)
  line L13 (25, -43.75) -> (0, -43.75)
  line L14 (0, -43.75) -> (0, -44)
  line L15 (0, -0.5) -> (25, -0.5)
  line L16 (25, -0.5) -> (25, -0.75)
  line L17 (25, -0.75) -> (0, -0.75)
  line L18 (0, -0.75) -> (0, -0.5)
  point P0 (4, -91)
  dimension "d210" = 0.5
  dimension "d211" = 0.5
  dimension "d214" = 0.25
  dimension "d215" = 0.25
extrude "Extrusion42" add sketch "Sketch53" along normal blind 15.5 contours L0 L1 L4 L5 | L1 L6 L10 L9
extrude "Extrusion43" add sketch "Sketch53" along normal blind 15.5 contours L1 L9 L14 L13 | L4 L1 L17 L18
sketch "Sketch54" plane through (-4, 13.5, 90.25) normal (0, -1, 0) x (1, 0, 0)
  point P0 (4, -90.25)
sketch "Sketch55" plane through (-4, 13.5, 90.25) normal (0, -1, 0) x (1, 0, 0)
  point P0 (4, -90.25)
sketch "Sketch56" plane through (-4, 13.5, 90.25) normal (0, -1, 0) x (1, 0, 0)
  point P0 (4, -90.25)
properties part number "ramie_1"
